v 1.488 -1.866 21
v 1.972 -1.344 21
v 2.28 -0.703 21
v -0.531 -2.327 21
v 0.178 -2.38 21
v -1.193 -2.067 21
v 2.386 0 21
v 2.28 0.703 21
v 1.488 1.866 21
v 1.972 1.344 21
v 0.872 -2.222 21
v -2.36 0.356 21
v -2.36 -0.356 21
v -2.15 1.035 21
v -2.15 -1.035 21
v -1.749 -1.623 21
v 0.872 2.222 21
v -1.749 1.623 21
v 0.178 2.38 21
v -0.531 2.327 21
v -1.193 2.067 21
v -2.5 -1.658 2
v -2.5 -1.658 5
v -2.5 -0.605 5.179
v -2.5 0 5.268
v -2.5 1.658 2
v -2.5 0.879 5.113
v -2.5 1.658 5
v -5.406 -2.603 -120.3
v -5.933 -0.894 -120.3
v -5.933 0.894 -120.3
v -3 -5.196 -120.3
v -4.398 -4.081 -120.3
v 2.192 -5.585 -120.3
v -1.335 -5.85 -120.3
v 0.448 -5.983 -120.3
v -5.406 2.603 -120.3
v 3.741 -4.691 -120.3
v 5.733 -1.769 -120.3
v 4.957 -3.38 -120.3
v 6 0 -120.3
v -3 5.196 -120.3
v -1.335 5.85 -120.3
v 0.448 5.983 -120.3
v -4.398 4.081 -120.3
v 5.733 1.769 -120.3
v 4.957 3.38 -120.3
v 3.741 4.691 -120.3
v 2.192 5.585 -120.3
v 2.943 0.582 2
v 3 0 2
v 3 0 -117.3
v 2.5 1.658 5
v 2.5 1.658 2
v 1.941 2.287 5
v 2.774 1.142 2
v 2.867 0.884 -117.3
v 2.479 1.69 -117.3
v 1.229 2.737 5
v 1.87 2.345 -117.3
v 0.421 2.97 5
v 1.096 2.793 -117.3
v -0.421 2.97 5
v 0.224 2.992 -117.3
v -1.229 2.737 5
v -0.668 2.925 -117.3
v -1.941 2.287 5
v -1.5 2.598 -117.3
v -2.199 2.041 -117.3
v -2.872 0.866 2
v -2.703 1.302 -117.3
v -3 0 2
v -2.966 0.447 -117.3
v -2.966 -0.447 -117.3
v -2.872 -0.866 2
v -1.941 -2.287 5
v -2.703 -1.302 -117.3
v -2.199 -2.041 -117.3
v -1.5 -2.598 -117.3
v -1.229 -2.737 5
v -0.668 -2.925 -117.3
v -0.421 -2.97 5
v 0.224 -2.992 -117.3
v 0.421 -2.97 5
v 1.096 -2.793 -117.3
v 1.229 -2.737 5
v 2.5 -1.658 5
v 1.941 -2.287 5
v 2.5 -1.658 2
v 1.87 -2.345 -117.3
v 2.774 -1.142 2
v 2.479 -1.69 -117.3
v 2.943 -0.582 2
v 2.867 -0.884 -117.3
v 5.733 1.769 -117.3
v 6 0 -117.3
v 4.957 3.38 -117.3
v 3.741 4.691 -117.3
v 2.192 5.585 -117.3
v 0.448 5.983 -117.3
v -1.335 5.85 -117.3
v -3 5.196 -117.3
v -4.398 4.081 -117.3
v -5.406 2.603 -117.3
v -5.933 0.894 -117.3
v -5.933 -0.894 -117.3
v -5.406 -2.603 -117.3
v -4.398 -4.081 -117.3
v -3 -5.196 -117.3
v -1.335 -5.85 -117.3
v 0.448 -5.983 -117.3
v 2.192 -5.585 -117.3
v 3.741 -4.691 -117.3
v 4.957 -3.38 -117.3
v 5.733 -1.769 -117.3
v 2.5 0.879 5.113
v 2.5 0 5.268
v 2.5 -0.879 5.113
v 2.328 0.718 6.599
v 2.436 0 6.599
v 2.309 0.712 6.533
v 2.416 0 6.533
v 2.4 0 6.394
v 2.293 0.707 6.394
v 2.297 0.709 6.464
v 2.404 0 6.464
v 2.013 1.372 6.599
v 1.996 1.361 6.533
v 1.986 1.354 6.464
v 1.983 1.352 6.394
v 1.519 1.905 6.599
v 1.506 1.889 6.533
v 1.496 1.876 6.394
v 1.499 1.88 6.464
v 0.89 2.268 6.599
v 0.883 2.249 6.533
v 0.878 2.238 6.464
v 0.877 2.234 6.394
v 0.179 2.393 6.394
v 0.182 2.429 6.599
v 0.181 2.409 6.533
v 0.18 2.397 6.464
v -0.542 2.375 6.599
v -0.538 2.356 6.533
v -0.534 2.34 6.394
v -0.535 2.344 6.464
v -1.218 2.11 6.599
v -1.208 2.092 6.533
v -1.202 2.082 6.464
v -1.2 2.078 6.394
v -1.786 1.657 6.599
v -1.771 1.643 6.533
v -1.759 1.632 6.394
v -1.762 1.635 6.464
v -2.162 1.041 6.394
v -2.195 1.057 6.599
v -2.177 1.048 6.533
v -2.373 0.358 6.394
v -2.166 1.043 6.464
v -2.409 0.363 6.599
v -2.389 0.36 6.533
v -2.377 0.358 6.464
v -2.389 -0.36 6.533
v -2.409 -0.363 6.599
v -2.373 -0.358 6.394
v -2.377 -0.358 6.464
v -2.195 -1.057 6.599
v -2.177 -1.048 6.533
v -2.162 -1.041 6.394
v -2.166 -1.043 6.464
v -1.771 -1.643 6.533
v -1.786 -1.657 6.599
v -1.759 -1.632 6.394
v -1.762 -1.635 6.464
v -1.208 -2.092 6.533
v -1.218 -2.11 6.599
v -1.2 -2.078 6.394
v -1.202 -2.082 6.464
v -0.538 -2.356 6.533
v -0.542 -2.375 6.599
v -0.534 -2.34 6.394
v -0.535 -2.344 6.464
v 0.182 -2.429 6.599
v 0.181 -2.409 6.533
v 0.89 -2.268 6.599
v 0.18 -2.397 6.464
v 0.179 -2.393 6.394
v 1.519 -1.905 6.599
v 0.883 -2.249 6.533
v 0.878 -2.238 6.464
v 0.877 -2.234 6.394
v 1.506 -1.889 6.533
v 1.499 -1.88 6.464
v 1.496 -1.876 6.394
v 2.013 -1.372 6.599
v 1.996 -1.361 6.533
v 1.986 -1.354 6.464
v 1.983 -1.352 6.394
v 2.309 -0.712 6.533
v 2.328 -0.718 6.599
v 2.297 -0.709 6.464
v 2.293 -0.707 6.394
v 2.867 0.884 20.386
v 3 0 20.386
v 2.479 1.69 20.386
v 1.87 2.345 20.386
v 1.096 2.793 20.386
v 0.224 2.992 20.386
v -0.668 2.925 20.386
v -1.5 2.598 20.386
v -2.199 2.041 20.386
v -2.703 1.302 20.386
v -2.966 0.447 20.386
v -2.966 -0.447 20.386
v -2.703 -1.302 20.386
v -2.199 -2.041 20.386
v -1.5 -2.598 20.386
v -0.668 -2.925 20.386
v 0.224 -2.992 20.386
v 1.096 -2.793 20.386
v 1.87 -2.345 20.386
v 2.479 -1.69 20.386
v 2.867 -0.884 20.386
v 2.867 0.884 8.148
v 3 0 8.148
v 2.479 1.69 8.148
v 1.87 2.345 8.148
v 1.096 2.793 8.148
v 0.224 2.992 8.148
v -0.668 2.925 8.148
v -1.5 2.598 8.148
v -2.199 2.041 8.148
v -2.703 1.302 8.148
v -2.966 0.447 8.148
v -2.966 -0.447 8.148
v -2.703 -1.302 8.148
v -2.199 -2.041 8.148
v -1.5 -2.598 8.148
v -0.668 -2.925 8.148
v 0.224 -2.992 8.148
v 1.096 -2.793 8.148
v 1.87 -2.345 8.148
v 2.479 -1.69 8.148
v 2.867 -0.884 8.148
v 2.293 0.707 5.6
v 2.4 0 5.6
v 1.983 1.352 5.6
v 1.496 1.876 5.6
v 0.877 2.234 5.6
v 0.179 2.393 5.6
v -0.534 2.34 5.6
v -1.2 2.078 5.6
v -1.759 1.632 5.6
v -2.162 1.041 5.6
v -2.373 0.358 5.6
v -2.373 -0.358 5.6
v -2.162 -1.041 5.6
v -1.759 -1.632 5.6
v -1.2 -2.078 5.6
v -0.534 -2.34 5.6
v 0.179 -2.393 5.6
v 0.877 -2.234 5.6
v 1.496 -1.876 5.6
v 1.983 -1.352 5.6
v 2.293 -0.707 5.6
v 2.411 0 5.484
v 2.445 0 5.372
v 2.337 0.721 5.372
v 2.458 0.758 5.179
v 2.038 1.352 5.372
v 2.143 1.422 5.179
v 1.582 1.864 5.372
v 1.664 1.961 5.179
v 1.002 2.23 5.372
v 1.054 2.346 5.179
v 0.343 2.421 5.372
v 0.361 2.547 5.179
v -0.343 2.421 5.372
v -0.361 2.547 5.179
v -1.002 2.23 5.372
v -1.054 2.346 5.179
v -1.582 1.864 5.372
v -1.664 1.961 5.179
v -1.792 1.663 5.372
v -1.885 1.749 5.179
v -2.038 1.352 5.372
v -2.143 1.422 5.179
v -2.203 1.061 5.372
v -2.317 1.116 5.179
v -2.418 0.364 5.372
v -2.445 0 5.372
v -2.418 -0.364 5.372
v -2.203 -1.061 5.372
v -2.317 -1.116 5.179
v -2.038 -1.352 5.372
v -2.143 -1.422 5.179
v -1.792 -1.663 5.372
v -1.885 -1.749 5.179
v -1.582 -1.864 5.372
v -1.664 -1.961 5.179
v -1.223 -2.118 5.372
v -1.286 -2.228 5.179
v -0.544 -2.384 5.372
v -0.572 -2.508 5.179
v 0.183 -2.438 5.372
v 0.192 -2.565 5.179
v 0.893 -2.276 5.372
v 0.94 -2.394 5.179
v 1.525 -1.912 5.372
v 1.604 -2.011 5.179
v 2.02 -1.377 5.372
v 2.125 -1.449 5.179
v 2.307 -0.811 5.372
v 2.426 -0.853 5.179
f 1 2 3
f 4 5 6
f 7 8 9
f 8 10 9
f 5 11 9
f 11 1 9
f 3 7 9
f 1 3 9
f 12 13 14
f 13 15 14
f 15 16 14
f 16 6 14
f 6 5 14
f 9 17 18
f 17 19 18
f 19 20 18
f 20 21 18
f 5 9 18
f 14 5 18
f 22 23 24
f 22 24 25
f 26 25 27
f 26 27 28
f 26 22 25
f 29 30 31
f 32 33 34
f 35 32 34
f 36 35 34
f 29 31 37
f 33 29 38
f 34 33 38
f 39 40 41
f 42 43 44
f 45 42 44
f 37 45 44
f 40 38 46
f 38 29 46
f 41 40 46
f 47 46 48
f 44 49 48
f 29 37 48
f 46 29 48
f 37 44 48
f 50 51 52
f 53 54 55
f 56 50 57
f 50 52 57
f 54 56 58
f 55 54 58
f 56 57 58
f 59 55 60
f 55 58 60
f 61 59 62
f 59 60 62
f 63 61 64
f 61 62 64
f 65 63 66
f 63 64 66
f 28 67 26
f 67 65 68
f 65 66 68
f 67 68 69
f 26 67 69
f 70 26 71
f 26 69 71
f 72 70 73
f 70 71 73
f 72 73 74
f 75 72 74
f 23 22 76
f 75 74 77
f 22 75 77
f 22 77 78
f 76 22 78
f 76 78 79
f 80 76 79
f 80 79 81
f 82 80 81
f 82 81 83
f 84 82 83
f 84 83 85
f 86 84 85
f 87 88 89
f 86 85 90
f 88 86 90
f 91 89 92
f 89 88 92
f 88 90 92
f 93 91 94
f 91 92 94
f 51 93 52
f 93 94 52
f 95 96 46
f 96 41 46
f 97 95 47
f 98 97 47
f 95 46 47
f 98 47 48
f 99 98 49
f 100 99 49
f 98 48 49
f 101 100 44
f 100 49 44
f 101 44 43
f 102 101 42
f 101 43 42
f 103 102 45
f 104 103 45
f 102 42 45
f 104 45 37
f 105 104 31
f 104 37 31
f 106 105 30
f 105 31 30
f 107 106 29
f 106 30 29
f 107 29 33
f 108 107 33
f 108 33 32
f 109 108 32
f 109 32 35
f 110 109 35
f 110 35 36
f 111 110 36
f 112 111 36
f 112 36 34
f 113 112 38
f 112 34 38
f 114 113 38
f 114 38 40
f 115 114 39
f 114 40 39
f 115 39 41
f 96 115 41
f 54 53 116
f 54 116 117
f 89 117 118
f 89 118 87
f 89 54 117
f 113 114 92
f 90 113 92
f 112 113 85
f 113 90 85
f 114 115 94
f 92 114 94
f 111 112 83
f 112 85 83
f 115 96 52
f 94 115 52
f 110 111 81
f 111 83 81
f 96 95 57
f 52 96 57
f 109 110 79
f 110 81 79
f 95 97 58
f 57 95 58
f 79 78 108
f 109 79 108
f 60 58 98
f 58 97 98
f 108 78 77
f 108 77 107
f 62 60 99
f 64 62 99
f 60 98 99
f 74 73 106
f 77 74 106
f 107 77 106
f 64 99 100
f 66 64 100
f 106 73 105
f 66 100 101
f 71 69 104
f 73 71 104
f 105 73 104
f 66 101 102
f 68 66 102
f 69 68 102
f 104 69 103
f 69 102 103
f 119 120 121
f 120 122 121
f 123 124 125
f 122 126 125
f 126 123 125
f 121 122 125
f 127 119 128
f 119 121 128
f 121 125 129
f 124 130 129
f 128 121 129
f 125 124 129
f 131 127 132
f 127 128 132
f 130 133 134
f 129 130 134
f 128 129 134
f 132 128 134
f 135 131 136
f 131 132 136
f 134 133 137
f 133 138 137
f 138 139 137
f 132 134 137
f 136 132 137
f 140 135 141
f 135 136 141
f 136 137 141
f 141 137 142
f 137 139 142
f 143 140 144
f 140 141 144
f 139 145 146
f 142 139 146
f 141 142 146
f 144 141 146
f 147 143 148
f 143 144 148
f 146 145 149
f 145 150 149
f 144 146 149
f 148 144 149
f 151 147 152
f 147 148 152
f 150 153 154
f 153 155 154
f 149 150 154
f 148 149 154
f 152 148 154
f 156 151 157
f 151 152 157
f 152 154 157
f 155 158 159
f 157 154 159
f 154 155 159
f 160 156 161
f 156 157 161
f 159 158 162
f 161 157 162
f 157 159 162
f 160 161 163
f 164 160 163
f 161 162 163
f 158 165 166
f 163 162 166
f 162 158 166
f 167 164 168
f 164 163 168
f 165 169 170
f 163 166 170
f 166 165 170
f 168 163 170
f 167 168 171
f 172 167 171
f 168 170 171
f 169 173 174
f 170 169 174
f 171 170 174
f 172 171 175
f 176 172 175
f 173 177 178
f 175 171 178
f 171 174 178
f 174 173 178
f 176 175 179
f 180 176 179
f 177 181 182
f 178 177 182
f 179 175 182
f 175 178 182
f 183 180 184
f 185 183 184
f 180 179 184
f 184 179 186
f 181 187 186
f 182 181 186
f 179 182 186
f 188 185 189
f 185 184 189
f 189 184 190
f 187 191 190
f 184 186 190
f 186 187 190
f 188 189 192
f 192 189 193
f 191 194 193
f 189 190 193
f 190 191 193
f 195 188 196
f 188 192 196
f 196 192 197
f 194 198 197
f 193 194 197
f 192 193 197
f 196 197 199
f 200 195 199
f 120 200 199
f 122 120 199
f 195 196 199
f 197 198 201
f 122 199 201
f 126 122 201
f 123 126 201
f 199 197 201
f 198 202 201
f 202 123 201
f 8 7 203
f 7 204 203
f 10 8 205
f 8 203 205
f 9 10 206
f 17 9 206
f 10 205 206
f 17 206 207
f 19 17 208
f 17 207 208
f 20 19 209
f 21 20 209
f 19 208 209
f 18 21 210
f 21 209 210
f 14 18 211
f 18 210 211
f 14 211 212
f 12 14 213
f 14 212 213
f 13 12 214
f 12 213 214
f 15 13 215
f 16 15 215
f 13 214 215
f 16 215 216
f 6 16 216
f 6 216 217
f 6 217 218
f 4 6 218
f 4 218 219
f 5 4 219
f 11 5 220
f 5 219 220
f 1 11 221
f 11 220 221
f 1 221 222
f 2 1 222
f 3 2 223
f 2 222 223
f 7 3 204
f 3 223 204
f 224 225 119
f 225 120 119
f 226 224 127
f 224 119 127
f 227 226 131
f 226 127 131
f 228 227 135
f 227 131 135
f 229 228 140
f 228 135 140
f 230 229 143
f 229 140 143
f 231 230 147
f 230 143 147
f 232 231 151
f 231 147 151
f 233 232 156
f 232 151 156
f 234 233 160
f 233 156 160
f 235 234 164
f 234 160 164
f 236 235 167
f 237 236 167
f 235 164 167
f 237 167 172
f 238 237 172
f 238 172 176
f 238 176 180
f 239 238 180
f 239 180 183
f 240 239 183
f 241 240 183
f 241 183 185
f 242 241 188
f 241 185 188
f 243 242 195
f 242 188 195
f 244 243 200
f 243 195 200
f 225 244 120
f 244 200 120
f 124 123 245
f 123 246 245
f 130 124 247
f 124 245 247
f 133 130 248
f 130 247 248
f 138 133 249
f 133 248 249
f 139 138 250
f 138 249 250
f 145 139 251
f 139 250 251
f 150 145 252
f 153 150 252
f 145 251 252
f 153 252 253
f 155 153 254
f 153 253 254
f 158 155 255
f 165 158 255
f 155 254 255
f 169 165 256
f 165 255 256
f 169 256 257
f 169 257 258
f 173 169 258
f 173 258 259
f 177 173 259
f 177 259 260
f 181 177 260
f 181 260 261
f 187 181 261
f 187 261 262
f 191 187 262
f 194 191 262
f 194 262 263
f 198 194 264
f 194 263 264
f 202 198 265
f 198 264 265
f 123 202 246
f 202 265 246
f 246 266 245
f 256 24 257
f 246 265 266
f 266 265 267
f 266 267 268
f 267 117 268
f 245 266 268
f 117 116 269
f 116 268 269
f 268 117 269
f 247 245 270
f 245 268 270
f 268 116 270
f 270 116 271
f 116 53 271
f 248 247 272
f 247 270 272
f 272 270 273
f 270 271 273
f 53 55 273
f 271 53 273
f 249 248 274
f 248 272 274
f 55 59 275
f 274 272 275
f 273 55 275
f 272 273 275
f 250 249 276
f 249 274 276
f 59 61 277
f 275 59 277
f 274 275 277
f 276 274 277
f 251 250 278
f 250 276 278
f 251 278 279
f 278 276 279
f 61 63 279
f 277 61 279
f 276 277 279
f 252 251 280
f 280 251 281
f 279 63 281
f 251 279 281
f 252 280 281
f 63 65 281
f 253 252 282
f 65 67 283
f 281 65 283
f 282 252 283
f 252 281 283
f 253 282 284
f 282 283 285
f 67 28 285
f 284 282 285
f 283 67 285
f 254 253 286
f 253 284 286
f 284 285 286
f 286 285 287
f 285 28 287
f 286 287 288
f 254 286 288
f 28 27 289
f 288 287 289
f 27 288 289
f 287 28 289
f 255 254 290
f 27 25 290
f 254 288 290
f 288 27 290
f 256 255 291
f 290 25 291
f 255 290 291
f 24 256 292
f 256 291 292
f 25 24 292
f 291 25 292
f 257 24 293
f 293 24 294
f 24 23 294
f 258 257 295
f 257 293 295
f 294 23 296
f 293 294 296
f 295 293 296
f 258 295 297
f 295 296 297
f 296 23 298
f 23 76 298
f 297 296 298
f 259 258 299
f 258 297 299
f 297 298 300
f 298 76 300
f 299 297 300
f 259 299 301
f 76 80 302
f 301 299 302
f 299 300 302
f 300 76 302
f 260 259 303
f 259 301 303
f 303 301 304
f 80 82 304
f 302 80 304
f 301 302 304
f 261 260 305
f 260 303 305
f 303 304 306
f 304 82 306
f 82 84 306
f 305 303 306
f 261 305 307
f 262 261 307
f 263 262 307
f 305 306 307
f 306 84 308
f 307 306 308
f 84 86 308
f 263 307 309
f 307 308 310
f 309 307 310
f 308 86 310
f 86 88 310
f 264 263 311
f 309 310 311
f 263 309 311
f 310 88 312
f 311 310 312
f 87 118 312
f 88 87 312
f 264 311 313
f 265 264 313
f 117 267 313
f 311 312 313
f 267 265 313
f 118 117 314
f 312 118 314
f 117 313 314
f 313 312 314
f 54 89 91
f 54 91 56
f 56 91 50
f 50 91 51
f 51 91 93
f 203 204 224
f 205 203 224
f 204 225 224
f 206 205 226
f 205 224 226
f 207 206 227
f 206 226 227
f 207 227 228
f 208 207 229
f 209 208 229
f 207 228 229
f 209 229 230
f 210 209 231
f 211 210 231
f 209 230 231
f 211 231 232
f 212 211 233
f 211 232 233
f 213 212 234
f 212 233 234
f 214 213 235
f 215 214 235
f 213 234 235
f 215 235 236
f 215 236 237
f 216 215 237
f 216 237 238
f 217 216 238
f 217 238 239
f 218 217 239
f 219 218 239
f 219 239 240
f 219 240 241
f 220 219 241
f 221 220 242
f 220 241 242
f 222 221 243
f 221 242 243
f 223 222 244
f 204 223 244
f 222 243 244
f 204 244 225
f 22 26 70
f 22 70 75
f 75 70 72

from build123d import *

# Parameters (mm, degrees)
CUT_EXTRUDE1_DEPTH = 4


with BuildPart() as part:
    # Sketch1 → Revolve1 (revolve)
    with BuildSketch(Plane(origin=(0, 0, 0), x_dir=(0, 0, -1), z_dir=(1, 0, 0))):
        Polygon((-5, 0), (-5, 3), (117.3, 3), (117.3, 6), (120.3, 6), (120.3, 0), align=None)
    revolve(axis=Axis((0, 0, -120.3), (0, 0, 1)))

    # Sketch2 → Revolve2 (revolve)
    with BuildSketch(Plane(origin=(0, 0, 0), x_dir=(0, 0, -1), z_dir=(1, 0, 0))):
        with BuildLine():
            Line((-21, 0), (-21, 2.3865))
            Line((-21, 2.3865), (-20.3865, 3))
            Line((-20.3865, 3), (-8.148486452, 3))
            Line((-8.148486452, 3), (-6.599415898, 2.436184428))
            ThreePointArc((-6.599415898, 2.436184428), (-6.498392718, 2.409115348), (-6.394203812, 2.4))
            Line((-6.394203812, 2.4), (-5.6, 2.4))
            ThreePointArc((-5.6, 2.4), (-5.175735931, 2.575735931), (-5, 3))
            Line((-5, 3), (-4, 3))
            Line((-4, 3), (-4, 0))
            Line((-4, 0), (-21, 0))
        make_face()
    revolve(axis=Axis((0, 0, 4), (0, 0, 1)))

    # Sketch3 → Cut-Extrude1 (cut)
    with BuildSketch(Plane.XY.offset(2)):
        Polygon((-5, 10), (-5, -5), (-2.5, -5), (-2.5, 5), (2.5, 5), (2.5, -5), (5, -5), (5, 10), align=None)
    extrude(amount=CUT_EXTRUDE1_DEPTH, mode=Mode.SUBTRACT)


solid = part.part
